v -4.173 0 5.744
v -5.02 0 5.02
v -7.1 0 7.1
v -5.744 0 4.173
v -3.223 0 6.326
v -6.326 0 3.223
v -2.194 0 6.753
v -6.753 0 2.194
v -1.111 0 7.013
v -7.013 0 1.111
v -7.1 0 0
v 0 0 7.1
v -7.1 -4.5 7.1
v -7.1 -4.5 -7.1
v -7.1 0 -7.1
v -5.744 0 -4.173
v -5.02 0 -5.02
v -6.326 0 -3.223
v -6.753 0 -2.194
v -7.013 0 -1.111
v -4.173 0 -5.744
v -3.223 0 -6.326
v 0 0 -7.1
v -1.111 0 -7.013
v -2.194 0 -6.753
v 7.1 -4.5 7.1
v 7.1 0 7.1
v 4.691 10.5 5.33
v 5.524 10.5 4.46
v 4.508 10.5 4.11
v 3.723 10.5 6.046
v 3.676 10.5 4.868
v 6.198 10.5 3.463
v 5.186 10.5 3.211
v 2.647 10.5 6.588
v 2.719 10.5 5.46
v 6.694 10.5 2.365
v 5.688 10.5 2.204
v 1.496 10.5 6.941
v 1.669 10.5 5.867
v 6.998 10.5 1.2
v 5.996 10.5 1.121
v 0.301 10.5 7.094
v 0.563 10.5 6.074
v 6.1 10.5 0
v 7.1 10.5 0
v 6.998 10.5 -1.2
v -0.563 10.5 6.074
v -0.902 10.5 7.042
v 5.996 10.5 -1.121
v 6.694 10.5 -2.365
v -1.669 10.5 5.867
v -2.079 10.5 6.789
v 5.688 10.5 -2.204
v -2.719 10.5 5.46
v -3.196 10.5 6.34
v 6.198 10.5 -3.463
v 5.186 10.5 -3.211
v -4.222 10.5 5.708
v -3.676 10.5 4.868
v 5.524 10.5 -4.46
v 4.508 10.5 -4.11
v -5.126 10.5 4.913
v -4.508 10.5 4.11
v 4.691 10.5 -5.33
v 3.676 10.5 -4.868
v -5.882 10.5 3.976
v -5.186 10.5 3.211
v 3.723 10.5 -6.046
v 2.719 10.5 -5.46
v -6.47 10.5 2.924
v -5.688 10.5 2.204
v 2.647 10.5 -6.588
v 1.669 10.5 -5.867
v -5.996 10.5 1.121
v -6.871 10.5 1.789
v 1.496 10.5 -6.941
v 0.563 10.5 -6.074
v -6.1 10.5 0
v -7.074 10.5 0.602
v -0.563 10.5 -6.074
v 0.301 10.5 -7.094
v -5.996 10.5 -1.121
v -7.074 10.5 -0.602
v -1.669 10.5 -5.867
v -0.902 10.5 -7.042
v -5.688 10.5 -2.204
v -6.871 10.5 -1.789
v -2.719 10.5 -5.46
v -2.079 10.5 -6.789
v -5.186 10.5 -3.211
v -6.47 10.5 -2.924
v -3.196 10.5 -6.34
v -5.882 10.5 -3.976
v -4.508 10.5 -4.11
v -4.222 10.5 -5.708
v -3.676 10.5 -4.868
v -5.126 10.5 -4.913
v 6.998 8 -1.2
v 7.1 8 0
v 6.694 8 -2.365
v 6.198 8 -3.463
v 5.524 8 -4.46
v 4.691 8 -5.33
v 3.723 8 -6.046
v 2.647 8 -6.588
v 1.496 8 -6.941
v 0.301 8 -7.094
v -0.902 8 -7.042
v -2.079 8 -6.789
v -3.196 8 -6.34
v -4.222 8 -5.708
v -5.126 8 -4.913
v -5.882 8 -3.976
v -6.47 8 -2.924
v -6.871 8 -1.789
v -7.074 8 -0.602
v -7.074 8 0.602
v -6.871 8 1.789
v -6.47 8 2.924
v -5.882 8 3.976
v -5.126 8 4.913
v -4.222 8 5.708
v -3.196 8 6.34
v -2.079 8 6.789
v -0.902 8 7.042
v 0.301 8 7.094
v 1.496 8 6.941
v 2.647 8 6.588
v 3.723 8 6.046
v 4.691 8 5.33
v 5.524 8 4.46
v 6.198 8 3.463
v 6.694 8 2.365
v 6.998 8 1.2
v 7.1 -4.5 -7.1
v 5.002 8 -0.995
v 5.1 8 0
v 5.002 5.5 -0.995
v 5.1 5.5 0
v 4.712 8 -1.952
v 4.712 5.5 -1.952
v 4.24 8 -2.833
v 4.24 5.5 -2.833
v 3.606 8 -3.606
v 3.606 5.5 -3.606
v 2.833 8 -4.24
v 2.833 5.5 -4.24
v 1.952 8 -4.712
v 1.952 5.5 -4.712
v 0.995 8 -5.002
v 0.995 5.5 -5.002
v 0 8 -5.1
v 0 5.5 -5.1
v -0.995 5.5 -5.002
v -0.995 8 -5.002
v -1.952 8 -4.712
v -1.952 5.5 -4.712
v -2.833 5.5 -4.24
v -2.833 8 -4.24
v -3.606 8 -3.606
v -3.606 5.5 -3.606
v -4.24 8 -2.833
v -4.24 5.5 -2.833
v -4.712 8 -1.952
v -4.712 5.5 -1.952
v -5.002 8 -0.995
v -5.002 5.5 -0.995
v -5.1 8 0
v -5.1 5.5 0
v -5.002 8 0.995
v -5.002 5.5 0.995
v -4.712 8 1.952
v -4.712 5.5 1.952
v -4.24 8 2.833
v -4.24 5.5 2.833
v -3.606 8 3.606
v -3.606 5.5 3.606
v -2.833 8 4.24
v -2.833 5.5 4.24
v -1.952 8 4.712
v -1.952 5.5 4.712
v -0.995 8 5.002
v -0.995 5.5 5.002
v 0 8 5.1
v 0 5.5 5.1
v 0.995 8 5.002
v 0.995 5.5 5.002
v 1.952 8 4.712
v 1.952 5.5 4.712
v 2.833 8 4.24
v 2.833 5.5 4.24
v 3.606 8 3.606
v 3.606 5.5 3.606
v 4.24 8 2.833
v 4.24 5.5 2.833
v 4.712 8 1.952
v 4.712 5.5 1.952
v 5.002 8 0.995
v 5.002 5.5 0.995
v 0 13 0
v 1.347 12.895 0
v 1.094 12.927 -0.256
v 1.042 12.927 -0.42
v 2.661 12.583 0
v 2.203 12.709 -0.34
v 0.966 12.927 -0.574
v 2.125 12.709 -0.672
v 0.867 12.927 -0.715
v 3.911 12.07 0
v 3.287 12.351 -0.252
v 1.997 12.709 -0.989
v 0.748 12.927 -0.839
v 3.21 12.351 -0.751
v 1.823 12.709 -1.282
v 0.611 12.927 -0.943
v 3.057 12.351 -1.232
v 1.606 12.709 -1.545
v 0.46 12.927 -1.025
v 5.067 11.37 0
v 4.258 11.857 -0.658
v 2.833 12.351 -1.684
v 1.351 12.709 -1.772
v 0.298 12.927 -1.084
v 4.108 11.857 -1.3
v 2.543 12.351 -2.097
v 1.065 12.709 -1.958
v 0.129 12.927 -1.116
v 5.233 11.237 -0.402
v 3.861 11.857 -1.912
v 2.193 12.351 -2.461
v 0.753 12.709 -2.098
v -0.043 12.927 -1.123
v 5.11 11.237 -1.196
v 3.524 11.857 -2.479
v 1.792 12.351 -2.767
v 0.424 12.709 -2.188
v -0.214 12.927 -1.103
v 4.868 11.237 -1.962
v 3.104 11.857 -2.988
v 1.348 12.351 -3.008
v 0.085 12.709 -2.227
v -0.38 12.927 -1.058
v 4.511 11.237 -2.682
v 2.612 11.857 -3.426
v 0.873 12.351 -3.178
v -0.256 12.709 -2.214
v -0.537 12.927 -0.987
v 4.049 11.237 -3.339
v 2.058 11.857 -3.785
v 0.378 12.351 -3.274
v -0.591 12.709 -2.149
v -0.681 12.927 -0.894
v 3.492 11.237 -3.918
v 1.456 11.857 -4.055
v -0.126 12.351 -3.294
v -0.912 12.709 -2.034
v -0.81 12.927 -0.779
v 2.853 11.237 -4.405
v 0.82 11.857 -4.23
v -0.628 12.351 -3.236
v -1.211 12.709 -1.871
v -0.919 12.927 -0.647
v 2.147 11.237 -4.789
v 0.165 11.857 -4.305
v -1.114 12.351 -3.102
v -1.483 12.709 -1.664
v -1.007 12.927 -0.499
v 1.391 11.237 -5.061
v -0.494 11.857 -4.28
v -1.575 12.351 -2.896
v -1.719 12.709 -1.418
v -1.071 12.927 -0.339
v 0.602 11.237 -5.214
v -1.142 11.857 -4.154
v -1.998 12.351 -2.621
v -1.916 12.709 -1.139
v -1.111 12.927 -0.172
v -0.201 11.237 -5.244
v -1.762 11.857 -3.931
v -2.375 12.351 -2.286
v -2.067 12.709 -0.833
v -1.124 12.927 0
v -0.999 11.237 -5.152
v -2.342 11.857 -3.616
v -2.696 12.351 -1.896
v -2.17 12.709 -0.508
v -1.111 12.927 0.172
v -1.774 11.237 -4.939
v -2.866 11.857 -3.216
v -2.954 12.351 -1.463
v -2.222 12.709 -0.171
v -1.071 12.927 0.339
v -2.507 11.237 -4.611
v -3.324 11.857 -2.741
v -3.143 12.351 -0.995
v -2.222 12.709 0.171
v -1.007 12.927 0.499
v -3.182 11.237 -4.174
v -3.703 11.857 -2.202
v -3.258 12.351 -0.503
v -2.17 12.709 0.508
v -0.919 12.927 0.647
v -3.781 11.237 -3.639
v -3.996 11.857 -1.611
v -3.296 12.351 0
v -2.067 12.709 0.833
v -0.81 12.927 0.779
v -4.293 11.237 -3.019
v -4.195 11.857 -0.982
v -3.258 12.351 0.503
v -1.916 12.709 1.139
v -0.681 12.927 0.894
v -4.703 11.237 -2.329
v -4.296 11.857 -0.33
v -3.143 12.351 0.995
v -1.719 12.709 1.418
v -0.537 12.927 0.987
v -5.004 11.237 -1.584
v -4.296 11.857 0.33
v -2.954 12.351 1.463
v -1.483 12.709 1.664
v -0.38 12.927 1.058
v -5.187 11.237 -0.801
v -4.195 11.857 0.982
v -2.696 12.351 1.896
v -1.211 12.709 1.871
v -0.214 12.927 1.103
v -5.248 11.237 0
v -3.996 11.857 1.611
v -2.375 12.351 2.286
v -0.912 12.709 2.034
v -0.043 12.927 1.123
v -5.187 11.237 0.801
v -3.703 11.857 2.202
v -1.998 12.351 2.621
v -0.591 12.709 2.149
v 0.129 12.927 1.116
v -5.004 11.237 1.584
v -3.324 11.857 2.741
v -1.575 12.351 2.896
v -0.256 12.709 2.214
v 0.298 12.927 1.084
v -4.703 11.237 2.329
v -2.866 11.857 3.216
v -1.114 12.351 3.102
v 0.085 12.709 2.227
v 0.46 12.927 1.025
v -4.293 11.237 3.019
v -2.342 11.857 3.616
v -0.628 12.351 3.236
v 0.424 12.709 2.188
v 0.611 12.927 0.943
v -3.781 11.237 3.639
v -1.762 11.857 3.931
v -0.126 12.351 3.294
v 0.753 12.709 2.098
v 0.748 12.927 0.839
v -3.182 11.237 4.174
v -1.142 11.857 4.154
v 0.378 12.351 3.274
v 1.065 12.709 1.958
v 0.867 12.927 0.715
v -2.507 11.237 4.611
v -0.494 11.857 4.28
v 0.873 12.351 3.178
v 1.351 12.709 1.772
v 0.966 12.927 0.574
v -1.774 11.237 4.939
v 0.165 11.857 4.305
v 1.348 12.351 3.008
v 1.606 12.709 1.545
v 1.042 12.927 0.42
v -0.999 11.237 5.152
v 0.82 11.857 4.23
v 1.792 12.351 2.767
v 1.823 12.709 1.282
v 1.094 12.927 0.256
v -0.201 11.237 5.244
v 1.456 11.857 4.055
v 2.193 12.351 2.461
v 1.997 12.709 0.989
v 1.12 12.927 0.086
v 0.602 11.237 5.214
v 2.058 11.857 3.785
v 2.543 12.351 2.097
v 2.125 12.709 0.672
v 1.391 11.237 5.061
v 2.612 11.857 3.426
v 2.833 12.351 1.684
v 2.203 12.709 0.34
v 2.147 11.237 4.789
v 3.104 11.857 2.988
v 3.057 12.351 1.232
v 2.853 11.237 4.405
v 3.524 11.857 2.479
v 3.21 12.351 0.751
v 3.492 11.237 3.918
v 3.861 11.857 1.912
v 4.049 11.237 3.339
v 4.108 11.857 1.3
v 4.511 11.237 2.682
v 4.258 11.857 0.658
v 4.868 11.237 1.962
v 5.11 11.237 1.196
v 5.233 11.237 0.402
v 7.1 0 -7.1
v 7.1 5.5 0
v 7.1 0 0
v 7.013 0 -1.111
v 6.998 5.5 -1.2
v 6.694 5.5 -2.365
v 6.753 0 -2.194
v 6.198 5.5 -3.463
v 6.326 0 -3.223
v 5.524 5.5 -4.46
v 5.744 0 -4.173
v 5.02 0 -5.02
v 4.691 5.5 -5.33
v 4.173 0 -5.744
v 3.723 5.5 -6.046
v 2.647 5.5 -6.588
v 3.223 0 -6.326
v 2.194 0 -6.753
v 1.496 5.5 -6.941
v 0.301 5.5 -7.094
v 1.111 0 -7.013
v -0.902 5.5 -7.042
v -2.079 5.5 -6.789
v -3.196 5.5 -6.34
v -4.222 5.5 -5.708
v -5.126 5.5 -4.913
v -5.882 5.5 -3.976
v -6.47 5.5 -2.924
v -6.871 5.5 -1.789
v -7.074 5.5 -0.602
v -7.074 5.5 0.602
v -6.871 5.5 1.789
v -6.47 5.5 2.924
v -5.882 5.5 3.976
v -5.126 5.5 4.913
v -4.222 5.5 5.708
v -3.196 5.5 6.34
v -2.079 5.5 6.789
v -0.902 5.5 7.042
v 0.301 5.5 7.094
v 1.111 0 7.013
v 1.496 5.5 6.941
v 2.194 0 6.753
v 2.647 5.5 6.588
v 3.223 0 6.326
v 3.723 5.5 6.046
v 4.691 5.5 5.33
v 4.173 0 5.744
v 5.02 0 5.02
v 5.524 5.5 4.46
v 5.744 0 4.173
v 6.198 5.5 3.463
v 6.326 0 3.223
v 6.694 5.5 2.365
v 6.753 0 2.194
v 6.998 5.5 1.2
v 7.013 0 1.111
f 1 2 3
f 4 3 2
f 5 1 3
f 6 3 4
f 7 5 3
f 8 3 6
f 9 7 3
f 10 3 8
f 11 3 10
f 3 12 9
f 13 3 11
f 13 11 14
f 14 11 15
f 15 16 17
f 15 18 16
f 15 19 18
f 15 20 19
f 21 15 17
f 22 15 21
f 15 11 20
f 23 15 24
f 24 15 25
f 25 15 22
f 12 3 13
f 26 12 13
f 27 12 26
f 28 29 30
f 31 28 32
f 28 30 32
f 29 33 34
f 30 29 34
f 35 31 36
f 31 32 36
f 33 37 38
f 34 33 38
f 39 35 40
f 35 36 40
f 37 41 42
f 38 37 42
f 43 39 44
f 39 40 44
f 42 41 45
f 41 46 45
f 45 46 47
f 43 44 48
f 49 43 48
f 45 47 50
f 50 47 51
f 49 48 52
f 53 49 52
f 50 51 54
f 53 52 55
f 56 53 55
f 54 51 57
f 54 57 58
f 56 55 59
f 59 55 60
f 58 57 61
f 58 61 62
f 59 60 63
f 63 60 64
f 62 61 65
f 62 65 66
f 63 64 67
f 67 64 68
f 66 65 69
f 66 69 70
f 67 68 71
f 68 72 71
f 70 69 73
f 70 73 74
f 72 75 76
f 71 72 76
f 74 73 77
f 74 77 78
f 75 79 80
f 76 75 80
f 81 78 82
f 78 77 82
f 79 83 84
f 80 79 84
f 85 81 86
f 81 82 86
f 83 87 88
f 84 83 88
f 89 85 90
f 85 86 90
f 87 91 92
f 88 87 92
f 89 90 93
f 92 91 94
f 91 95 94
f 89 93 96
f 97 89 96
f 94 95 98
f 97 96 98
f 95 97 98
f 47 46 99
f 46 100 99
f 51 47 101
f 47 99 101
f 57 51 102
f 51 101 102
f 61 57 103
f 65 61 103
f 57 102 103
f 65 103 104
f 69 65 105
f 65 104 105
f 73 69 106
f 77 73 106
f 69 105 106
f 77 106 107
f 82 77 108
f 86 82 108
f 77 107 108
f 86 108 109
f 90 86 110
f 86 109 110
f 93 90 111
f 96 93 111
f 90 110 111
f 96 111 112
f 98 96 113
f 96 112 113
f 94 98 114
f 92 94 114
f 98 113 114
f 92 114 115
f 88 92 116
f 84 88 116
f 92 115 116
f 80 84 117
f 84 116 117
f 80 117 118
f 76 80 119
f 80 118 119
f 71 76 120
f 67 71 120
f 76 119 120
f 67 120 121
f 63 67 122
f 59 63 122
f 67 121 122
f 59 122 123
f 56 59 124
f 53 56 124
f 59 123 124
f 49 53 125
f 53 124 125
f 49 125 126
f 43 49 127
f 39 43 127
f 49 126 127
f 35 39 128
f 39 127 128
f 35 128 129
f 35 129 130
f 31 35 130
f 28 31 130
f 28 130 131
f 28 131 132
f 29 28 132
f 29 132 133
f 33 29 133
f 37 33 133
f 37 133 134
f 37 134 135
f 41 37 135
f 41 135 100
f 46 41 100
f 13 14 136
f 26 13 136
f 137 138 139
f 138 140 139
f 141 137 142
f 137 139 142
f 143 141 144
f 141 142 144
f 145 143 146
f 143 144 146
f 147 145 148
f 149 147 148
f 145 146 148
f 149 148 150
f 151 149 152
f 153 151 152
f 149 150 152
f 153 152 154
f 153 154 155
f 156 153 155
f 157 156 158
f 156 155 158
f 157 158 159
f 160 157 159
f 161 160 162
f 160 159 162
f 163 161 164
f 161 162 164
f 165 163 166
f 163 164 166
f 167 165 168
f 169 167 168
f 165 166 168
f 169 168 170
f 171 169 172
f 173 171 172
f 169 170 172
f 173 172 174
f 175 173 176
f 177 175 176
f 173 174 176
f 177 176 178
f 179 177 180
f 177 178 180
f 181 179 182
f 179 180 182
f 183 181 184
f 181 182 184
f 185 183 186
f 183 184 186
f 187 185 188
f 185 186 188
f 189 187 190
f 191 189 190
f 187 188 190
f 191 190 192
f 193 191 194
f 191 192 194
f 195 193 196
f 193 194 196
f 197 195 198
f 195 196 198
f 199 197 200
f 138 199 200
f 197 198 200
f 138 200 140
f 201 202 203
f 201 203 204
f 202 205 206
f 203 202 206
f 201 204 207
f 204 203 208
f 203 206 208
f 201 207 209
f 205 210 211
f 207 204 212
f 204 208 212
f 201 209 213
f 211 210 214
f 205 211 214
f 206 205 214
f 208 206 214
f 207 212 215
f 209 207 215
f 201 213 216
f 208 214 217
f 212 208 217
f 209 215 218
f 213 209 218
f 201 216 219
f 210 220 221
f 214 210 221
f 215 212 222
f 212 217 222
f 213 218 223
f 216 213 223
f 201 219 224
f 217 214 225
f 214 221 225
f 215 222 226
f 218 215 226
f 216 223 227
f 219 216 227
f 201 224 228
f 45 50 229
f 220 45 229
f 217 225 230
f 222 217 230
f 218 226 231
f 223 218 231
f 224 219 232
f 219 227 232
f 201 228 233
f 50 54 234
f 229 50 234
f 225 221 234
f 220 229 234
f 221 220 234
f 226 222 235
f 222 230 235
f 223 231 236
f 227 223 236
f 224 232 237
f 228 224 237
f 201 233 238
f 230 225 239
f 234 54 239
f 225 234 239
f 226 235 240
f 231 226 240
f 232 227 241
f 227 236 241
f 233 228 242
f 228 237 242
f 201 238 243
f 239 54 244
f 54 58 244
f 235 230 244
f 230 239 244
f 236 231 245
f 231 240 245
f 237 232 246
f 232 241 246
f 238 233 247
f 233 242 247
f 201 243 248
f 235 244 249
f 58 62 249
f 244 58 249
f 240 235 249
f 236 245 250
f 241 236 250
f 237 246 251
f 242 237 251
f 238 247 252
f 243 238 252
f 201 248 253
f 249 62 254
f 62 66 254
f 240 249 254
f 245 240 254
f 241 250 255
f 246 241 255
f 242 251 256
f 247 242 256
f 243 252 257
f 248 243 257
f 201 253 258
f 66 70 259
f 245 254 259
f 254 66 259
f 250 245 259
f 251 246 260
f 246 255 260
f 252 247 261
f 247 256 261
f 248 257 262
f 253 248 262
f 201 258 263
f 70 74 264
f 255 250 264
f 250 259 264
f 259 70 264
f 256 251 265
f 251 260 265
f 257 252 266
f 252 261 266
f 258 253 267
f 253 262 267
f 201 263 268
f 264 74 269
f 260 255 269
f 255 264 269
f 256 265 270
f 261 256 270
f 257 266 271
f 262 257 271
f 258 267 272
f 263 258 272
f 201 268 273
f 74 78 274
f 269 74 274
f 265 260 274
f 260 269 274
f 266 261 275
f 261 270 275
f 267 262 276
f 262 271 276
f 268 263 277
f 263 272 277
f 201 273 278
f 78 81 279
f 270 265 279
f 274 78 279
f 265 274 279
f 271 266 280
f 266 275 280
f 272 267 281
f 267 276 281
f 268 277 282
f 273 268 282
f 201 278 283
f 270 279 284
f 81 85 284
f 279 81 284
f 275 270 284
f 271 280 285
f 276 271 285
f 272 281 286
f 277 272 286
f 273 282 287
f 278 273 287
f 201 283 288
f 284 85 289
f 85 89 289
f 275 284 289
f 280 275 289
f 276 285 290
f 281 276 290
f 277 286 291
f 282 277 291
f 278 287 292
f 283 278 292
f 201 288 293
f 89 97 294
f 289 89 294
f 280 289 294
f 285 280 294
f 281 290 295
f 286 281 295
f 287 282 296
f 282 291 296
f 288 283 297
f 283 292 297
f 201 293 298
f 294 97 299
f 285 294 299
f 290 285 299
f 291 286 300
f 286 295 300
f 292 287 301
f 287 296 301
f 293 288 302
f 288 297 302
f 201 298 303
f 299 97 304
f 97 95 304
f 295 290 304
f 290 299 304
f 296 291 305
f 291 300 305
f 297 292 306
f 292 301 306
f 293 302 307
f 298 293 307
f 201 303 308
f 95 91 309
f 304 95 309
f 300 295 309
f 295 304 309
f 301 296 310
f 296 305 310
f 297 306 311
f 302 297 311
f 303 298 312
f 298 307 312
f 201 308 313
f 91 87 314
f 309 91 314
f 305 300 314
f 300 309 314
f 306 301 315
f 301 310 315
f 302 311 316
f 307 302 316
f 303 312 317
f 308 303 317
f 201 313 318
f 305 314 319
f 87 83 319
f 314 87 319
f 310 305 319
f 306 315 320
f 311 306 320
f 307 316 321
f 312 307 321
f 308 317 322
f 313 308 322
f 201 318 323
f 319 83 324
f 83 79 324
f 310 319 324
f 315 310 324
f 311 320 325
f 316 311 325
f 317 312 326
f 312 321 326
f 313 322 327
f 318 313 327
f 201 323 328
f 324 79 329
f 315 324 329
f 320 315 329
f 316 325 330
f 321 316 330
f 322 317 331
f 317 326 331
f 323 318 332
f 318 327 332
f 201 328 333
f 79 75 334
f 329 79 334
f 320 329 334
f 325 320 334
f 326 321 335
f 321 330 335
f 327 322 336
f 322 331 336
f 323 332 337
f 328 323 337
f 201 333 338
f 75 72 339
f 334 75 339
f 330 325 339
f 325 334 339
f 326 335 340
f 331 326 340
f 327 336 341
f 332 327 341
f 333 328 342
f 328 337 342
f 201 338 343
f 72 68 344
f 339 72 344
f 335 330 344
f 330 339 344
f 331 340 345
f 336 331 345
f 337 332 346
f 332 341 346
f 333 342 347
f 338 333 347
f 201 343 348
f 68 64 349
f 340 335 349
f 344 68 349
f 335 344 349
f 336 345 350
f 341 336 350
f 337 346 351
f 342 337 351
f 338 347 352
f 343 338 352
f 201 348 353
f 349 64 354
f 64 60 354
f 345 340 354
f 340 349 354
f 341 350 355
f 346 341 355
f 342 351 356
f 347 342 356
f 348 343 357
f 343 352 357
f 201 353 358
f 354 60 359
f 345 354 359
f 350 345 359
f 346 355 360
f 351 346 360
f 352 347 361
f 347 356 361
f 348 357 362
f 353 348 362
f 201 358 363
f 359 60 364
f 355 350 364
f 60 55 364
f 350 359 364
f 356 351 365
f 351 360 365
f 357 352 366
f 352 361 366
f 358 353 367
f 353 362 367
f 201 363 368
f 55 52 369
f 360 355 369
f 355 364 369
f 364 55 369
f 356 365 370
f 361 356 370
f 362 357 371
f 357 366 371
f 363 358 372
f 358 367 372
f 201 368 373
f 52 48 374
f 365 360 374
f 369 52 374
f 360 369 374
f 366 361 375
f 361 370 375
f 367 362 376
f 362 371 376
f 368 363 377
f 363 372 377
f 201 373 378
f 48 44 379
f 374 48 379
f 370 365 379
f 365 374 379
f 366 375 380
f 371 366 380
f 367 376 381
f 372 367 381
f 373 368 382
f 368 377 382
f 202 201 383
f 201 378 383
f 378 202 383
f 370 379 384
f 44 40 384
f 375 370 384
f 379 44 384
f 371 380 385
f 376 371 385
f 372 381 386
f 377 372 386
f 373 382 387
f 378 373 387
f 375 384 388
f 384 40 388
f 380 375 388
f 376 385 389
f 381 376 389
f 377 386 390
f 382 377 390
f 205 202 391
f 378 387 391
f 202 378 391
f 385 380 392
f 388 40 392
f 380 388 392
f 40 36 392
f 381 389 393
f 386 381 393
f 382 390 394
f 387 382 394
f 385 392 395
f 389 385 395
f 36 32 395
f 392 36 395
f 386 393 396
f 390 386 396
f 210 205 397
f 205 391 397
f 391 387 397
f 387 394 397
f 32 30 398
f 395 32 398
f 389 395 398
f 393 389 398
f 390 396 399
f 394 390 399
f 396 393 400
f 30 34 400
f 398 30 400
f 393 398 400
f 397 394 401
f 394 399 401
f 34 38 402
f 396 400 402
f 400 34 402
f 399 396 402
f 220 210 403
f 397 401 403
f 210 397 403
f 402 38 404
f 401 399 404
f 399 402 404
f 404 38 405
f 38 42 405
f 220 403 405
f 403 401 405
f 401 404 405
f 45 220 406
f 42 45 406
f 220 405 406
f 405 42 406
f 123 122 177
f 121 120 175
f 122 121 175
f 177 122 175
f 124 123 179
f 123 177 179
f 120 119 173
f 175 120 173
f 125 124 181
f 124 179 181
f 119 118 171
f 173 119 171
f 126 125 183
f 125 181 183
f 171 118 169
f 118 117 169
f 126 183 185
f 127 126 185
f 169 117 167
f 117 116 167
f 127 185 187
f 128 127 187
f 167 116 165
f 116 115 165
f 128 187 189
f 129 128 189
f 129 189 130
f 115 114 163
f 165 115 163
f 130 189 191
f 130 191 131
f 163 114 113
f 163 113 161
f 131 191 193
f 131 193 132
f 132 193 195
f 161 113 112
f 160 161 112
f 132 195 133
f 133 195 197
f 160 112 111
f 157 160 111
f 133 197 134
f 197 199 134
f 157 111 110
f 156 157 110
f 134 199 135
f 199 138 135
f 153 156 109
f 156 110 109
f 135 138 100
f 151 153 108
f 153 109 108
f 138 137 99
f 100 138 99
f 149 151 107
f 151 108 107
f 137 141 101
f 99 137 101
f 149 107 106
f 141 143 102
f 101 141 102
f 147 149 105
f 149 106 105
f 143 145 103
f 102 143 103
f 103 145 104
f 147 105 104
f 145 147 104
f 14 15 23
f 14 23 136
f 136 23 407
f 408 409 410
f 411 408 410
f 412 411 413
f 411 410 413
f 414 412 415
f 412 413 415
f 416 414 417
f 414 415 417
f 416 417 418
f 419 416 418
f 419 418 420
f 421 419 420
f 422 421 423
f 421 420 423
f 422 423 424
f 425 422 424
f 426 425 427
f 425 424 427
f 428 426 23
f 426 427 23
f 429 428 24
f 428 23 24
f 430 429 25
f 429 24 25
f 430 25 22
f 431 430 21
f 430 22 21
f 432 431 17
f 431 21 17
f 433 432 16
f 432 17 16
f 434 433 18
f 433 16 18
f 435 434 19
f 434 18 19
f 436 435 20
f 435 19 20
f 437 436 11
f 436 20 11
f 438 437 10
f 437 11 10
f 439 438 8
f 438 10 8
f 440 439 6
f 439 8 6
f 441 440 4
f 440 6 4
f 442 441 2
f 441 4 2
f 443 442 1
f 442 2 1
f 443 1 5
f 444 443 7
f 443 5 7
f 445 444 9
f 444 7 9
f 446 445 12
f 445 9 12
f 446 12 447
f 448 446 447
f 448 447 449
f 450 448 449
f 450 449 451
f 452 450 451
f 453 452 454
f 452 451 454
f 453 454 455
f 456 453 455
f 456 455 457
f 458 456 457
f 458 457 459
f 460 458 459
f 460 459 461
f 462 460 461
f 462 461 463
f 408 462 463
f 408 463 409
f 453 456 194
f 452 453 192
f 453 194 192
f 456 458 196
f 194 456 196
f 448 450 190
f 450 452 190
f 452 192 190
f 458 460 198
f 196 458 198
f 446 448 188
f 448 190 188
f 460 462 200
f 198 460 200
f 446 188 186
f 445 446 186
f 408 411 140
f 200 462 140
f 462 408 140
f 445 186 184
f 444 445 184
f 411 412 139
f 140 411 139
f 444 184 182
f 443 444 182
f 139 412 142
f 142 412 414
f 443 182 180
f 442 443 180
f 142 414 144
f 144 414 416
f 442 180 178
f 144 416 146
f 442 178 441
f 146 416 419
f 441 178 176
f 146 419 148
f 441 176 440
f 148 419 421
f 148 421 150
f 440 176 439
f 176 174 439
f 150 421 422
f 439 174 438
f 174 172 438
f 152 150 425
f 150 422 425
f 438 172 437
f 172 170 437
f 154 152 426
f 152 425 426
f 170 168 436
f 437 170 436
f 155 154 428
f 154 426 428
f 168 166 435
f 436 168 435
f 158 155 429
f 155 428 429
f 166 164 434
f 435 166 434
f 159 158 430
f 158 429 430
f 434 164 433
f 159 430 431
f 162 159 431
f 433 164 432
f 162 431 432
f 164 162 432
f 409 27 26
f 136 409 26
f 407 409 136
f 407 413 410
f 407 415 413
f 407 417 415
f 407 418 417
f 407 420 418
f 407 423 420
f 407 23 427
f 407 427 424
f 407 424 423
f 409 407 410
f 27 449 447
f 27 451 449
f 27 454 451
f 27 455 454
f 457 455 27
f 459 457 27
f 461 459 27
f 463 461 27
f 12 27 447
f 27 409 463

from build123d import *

# Parameters (mm, degrees)
SKETCH3_W           = 14.2
SKETCH3_H           = 14.2
BOSS_EXTRUDE1_DEPTH = 4.5


with BuildPart() as part:
    # Sketch2 → Revolve1 (revolve)
    with BuildSketch(Plane.XY):
        with BuildLine():
            Line((0, 0), (0, 13))
            ThreePointArc((0, 13), (3.296209945, 12.350752265), (6.1, 10.5))
            Line((6.1, 10.5), (7.1, 10.5))
            Line((7.1, 10.5), (7.1, 8))
            Line((7.1, 8), (5.1, 8))
            Line((5.1, 8), (5.1, 5.5))
            Line((5.1, 5.5), (7.1, 5.5))
            Line((7.1, 5.5), (7.1, 0))
            Line((7.1, 0), (0, 0))
        make_face()
    revolve(axis=Axis((0, 0, 0), (0, 1, 0)))

    # Sketch3 → Boss-Extrude1 (add)
    with BuildSketch(Plane(origin=(0, 0, 0), x_dir=(1, 0, 0), z_dir=(0, 1, 0))):
        Rectangle(SKETCH3_W, SKETCH3_H)
    extrude(amount=-BOSS_EXTRUDE1_DEPTH)


solid = part.part
